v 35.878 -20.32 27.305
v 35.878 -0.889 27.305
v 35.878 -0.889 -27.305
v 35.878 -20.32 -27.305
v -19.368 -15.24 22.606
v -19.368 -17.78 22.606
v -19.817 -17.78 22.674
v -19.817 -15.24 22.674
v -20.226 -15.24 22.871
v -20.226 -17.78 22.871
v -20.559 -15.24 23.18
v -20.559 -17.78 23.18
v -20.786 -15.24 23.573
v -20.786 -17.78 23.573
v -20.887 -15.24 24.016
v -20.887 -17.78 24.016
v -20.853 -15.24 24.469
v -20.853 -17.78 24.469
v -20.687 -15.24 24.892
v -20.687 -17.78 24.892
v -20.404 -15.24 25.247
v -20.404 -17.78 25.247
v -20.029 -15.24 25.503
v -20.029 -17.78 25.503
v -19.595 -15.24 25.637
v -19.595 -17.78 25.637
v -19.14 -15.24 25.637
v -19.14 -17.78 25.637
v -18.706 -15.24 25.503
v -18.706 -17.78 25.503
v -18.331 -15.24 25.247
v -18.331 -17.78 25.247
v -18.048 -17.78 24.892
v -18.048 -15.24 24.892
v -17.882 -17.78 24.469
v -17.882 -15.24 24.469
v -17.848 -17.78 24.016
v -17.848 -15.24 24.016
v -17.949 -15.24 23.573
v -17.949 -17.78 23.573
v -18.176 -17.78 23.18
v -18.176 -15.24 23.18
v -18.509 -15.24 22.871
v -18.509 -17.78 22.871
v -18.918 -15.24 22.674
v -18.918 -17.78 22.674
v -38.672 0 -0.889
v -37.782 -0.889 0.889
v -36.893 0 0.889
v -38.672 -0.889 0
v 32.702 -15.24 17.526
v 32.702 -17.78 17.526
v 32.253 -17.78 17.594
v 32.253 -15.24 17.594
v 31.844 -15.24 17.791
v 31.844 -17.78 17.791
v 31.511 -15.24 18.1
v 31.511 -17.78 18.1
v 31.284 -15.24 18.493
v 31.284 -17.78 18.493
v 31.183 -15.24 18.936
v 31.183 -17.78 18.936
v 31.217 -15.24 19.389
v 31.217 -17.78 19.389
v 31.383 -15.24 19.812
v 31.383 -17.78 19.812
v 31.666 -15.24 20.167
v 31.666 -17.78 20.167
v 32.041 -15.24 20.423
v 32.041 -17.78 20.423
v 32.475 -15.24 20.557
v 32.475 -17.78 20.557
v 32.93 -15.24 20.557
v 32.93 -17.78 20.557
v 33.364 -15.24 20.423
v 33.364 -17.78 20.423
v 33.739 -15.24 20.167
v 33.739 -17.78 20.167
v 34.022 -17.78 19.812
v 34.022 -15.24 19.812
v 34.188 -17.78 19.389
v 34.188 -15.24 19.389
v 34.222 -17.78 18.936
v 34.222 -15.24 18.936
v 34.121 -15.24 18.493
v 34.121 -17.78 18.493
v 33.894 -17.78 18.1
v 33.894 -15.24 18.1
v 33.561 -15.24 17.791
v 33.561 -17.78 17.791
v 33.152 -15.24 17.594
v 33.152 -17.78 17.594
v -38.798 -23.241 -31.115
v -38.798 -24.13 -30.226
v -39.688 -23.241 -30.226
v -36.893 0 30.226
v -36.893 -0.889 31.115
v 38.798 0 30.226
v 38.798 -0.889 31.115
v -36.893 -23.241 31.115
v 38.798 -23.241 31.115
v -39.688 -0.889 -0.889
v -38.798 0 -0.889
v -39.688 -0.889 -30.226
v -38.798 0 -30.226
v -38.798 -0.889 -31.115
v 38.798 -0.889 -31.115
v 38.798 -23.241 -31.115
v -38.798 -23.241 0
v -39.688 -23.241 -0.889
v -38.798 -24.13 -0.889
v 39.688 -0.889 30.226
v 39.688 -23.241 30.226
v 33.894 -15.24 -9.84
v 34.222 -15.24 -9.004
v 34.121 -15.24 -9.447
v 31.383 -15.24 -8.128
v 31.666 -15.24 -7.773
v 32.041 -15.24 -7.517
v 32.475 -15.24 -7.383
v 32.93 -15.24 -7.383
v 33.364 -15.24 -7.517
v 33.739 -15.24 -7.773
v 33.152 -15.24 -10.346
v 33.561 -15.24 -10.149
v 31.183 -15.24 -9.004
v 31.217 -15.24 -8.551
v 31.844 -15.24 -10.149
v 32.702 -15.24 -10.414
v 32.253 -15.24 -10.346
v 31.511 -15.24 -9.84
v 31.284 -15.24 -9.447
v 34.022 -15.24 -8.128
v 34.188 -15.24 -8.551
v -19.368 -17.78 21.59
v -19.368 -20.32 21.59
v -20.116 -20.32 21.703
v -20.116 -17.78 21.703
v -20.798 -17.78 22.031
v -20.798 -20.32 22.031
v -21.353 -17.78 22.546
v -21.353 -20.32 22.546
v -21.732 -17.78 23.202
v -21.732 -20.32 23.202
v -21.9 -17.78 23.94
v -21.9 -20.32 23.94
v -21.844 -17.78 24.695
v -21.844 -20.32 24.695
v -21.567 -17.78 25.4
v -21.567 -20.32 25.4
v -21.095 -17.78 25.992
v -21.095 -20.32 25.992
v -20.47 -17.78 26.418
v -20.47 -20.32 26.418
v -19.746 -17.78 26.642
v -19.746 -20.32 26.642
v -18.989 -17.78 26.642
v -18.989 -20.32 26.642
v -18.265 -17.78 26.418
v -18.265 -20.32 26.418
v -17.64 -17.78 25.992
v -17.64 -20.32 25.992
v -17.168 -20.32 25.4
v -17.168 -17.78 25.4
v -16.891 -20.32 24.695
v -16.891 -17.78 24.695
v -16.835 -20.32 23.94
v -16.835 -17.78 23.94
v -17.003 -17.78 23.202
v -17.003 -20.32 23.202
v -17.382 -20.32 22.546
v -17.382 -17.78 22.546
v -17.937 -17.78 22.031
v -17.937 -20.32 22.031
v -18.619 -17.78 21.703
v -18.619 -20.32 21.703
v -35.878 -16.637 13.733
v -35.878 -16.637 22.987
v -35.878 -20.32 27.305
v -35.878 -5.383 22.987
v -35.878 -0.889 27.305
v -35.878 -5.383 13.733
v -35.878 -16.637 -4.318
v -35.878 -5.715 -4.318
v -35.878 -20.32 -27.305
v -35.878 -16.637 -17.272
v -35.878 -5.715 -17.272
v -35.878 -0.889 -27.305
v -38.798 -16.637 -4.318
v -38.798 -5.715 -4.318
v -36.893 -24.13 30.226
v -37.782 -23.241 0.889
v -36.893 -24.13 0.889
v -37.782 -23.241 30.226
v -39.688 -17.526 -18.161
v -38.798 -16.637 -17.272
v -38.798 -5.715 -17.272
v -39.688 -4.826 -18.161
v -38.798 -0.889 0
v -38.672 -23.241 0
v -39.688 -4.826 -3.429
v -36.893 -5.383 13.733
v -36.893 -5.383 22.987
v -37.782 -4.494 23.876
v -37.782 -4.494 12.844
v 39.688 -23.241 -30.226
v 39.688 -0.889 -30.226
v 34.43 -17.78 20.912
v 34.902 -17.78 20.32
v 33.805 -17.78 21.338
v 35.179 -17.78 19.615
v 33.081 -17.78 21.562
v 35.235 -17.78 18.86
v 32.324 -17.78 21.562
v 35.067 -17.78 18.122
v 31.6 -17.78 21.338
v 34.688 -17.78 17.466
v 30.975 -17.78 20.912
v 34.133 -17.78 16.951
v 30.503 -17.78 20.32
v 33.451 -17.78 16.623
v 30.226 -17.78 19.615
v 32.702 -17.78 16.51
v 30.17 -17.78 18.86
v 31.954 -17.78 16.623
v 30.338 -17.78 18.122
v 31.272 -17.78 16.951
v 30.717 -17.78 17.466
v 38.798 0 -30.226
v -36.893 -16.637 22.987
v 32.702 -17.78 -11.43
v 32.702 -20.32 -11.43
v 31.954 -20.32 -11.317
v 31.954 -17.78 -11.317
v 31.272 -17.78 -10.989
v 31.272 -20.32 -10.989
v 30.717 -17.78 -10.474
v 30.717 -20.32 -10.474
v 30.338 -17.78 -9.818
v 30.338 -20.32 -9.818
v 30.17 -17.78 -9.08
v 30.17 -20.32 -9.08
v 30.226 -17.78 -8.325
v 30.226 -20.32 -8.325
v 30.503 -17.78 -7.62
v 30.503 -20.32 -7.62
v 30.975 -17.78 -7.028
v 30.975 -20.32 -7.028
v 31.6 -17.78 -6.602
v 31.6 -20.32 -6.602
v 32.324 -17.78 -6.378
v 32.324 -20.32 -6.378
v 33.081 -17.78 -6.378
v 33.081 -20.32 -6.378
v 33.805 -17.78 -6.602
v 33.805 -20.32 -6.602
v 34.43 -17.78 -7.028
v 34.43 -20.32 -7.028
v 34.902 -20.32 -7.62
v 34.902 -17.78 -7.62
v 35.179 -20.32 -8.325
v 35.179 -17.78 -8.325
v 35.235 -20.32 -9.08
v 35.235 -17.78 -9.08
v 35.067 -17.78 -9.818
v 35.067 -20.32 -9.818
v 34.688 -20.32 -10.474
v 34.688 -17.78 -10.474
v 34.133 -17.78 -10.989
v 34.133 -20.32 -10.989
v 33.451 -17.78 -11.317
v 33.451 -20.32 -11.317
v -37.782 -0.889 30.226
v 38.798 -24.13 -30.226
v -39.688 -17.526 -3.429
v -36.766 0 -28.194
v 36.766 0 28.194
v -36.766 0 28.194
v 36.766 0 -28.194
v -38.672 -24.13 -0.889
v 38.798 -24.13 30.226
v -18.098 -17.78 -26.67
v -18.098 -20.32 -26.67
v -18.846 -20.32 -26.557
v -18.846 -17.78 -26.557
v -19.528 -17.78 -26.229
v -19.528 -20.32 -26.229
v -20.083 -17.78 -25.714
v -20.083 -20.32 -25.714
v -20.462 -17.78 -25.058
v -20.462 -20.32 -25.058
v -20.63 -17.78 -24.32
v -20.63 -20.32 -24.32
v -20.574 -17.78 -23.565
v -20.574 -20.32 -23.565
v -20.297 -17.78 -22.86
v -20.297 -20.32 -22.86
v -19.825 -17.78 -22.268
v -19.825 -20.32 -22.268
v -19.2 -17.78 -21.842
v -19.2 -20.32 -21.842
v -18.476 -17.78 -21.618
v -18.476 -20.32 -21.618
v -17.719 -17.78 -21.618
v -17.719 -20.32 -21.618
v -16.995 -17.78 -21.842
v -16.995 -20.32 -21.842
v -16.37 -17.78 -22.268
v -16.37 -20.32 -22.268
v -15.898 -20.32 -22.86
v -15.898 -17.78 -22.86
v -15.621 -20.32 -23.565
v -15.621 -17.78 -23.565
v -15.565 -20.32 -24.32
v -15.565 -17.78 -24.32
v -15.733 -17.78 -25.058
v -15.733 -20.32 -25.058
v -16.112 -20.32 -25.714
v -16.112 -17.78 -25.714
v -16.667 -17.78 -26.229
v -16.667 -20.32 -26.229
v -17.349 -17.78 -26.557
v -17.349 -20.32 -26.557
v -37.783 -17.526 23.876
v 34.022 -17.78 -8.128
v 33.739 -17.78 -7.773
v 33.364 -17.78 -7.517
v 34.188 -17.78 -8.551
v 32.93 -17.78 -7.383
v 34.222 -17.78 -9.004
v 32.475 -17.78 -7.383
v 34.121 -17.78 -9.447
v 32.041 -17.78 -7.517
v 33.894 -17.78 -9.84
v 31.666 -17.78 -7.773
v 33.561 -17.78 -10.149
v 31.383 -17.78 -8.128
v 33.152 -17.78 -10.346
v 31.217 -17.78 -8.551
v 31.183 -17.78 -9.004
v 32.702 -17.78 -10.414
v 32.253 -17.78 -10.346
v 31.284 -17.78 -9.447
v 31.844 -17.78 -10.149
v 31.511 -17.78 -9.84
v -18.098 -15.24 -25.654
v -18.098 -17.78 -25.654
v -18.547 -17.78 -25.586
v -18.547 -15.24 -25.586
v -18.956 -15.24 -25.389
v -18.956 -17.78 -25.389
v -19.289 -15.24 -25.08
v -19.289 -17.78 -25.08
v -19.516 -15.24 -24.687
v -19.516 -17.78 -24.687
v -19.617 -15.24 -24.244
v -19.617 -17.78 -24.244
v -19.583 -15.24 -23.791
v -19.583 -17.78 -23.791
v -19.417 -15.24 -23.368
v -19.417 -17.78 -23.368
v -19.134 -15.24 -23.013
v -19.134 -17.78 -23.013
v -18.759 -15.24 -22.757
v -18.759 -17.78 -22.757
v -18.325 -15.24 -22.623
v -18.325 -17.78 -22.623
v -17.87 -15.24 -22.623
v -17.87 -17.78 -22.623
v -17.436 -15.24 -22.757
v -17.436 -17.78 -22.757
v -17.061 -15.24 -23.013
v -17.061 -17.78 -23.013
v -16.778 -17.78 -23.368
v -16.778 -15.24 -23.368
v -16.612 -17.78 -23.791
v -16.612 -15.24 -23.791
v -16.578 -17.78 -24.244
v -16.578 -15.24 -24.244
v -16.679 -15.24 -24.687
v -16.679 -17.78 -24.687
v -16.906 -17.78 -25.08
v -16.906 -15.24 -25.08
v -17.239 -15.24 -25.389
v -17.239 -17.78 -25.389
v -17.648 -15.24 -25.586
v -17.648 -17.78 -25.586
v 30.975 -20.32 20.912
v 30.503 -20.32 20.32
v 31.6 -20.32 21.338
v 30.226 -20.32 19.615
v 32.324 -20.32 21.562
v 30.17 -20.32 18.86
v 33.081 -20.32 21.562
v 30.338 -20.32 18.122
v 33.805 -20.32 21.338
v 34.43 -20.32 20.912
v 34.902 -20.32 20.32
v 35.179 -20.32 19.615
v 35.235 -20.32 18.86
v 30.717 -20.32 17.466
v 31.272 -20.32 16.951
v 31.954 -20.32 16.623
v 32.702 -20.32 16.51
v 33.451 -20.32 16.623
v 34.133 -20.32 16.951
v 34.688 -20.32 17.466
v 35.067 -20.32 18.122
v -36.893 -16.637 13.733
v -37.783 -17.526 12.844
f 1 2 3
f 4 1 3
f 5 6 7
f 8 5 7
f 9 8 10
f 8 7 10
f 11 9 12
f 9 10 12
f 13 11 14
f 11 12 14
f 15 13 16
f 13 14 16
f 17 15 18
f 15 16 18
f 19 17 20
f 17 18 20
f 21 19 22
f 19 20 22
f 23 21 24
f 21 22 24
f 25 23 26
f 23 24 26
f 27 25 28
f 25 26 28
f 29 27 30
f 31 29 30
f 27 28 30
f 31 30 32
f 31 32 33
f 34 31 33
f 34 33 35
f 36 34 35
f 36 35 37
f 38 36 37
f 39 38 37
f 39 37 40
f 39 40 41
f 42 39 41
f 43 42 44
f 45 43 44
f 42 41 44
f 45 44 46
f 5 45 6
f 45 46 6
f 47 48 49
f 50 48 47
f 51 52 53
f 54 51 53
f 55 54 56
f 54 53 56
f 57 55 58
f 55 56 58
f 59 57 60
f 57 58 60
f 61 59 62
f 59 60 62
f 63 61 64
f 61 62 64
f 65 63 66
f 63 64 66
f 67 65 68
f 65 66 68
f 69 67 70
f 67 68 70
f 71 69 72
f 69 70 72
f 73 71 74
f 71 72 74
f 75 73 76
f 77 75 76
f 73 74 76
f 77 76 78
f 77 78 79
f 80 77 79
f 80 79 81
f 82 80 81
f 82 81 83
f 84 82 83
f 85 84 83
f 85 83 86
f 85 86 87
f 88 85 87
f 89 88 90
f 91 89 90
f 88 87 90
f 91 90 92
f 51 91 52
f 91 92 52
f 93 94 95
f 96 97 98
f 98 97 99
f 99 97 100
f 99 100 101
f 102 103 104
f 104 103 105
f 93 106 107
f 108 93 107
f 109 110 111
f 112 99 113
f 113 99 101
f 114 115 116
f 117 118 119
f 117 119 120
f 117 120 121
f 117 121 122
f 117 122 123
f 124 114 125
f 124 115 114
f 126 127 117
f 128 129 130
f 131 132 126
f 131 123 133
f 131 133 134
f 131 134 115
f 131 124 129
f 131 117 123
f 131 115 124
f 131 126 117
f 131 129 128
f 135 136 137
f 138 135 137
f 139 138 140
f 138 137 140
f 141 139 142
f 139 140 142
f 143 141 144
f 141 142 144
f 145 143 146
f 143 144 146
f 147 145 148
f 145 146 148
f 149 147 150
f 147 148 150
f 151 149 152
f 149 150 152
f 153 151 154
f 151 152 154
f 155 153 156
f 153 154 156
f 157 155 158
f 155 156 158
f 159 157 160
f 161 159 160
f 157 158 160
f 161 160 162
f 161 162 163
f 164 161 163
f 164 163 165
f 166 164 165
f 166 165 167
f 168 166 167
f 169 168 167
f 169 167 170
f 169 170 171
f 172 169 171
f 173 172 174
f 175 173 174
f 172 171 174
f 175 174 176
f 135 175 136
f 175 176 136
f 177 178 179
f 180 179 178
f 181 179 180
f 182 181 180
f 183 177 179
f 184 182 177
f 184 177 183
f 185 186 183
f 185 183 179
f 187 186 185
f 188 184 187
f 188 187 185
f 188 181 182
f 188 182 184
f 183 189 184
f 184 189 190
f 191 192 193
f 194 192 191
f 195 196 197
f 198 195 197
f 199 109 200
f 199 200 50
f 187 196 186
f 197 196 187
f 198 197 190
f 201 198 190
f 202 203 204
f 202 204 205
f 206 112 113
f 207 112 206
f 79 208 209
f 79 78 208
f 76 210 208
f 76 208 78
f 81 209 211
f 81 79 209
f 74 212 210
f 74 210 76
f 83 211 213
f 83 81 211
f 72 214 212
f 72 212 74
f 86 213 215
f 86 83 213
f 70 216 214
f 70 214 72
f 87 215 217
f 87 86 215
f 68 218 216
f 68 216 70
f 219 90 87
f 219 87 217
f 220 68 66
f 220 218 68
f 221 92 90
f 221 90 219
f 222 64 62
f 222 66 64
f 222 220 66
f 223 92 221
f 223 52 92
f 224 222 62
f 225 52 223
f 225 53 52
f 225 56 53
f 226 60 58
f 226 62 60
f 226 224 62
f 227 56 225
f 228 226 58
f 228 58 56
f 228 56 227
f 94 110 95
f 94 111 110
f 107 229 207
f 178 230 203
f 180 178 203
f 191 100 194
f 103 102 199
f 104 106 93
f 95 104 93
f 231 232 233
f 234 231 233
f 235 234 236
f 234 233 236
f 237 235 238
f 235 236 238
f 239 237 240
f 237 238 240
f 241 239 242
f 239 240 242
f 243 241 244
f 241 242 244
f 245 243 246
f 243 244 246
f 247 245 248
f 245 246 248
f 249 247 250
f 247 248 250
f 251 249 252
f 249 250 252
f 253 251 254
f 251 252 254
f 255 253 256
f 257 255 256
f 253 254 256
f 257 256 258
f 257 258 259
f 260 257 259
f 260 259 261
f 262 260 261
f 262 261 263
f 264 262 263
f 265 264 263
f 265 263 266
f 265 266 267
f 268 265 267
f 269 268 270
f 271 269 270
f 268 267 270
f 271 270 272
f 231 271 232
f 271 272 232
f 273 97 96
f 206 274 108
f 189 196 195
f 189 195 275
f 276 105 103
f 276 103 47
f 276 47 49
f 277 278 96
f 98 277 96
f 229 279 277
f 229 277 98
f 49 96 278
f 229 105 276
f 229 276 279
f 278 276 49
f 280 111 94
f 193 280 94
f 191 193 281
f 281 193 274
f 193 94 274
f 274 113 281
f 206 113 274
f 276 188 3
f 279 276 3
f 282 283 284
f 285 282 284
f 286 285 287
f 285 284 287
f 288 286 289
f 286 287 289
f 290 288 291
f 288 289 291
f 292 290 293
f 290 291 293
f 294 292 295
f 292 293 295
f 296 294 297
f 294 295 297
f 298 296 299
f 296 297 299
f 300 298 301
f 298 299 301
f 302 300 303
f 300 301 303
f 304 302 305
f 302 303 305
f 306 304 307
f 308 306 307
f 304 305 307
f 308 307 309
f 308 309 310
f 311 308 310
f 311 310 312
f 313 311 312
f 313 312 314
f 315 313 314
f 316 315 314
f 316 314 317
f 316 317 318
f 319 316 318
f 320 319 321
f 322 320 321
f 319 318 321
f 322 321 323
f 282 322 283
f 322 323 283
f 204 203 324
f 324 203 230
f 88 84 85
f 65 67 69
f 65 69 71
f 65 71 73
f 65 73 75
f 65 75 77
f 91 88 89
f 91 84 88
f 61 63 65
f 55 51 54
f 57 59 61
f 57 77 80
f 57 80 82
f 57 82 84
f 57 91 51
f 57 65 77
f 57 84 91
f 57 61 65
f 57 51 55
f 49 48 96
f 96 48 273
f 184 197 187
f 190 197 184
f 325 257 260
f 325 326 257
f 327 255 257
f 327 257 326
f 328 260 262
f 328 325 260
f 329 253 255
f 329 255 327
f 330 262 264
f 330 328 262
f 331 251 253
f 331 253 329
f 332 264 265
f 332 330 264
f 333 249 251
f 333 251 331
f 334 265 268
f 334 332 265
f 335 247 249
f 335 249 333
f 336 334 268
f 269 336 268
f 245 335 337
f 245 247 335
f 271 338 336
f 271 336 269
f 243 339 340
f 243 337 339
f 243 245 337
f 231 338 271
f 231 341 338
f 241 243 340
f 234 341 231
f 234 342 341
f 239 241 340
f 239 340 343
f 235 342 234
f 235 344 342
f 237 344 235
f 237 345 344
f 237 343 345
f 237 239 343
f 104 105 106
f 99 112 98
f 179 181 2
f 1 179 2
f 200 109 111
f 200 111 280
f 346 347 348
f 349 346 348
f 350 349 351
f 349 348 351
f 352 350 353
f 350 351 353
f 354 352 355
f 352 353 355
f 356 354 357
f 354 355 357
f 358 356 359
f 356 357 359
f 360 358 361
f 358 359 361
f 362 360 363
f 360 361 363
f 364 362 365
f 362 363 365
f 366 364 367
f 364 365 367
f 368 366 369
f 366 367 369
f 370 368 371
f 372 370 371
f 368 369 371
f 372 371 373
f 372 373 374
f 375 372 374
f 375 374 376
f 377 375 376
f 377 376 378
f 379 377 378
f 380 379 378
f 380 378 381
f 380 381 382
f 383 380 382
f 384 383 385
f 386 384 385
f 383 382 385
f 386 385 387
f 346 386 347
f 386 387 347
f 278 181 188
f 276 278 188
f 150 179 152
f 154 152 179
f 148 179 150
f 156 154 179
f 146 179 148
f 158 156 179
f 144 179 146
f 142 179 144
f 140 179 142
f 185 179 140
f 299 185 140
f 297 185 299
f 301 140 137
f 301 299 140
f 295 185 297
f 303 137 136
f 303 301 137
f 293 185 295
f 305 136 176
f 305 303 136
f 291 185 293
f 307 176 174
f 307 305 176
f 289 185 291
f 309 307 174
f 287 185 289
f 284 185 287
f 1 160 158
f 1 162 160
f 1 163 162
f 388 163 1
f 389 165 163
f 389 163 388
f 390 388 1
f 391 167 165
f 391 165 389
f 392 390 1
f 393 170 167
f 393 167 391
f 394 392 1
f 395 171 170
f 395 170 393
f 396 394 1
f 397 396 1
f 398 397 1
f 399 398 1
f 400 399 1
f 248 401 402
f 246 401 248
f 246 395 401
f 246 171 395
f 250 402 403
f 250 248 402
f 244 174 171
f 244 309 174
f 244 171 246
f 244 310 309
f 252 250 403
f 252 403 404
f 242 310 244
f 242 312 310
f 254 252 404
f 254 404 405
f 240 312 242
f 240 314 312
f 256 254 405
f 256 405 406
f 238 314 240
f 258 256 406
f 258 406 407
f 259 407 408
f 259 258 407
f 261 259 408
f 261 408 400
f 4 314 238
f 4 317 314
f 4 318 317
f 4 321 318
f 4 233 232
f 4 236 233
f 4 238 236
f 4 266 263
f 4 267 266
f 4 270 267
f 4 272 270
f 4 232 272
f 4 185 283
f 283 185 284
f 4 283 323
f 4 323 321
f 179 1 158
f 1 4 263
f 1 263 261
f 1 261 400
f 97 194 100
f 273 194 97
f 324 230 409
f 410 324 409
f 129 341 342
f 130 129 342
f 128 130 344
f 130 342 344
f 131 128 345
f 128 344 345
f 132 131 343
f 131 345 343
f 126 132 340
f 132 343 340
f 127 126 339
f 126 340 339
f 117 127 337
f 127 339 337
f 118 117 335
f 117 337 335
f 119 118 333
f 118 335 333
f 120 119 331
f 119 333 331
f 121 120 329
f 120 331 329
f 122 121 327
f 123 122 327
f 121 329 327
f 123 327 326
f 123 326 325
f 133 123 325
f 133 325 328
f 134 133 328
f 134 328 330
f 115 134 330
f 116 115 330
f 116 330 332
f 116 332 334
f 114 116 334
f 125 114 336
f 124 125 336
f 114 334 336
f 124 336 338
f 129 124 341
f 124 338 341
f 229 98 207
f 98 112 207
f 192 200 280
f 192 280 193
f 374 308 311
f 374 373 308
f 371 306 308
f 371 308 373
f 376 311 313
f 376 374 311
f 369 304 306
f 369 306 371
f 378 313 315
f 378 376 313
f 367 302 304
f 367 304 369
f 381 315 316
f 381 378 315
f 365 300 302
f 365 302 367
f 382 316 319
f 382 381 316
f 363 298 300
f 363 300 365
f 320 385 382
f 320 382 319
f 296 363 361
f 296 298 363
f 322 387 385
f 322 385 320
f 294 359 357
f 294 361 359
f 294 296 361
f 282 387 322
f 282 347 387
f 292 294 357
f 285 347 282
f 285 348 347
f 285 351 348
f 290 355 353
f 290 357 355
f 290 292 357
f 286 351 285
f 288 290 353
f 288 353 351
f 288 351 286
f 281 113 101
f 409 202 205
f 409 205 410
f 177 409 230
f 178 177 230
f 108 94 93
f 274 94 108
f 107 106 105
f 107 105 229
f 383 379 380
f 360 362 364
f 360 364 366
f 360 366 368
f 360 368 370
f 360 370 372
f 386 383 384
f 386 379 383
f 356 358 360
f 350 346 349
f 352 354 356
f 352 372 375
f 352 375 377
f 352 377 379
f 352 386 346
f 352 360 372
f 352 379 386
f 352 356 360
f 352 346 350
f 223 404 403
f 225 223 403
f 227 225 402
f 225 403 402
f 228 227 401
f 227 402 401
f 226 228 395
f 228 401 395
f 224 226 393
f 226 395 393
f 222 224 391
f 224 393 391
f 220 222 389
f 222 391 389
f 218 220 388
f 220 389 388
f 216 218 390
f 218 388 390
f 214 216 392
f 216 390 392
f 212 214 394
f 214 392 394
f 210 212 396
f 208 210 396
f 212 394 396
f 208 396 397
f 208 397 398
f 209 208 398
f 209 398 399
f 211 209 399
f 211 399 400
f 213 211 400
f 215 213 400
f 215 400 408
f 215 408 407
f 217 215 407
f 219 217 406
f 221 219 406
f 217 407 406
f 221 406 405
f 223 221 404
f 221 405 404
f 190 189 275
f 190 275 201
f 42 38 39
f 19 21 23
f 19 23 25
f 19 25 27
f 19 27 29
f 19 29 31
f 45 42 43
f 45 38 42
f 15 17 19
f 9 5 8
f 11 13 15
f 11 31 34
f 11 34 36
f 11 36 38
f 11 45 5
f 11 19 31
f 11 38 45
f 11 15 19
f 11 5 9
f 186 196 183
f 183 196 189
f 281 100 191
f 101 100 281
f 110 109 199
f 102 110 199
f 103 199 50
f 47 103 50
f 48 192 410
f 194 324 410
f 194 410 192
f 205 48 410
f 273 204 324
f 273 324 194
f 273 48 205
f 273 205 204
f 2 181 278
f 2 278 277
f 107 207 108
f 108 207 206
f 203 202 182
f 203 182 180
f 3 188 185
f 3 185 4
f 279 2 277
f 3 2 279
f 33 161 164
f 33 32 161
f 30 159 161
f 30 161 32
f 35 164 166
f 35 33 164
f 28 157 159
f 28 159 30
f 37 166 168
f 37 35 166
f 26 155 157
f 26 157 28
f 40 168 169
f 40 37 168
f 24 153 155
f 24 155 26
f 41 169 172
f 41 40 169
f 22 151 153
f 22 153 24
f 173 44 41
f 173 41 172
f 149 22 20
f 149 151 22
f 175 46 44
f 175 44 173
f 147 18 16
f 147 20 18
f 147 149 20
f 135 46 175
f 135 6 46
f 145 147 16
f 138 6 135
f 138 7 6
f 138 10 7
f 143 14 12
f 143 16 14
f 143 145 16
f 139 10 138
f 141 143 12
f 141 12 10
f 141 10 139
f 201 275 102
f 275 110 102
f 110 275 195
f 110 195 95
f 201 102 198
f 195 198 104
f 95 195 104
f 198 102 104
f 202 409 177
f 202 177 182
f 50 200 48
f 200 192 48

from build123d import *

# Parameters (mm, degrees)
SKETCH1_W           = 79.375
SKETCH1_H           = 62.23
BOSS_EXTRUDE1_DEPTH = 24.13
SHELL1_T            = -3.81
RISER_BASE_SKETCH_R = 2.54
BOSS_EXTRUDE3_DEPTH = 2.54
SKETCH9_R           = 1.524
BOSS_EXTRUDE4_DEPTH = 2.54
SKETCH10_W          = 12.954
SKETCH10_H          = 10.922
CUT_EXTRUDE1_DEPTH  = 3.81
SKETCH12_W          = 9.254
SKETCH12_H          = 11.254
CUT_EXTRUDE2_DEPTH  = 3.81
SKETCH13_W          = 31.115
SKETCH13_H          = 24.13
CUT_EXTRUDE3_DEPTH  = 1.905
CHAMFER1_SIZE       = 0.889


with BuildPart() as part:
    # Sketch1 → Boss-Extrude1 (new body)
    with BuildSketch(Plane(origin=(0, 0, 0), x_dir=(1, 0, 0), z_dir=(0, 1, 0))):
        Rectangle(SKETCH1_W, SKETCH1_H)
    extrude(amount=-BOSS_EXTRUDE1_DEPTH)

    # Shell1
    shell1_openings = [part.faces().sort_by_distance(p)[0] for p in [
        (0, 0, 0),
    ]]
    offset(amount=SHELL1_T, openings=shell1_openings, kind=Kind.INTERSECTION)

    # riser base sketch → Boss-Extrude3 (add)
    with BuildSketch(Plane(origin=(0, -20.32, 0), x_dir=(1, 0, 0), z_dir=(0, 1, 0))):
        with Locations(Location((32.7025, 8.89, 0), (0, 0, 90))):
            Circle(RISER_BASE_SKETCH_R)
        with Locations(Location((-18.0975, 24.13, 0), (0, 0, 90))):
            Circle(RISER_BASE_SKETCH_R)
        with Locations(Location((-19.3675, -24.13, 0), (0, 0, 90))):
            Circle(RISER_BASE_SKETCH_R)
        with Locations(Location((32.7025, -19.05, 0), (0, 0, 90))):
            Circle(RISER_BASE_SKETCH_R)
    extrude(amount=BOSS_EXTRUDE3_DEPTH)

    # Sketch9 → Boss-Extrude4 (add)
    with BuildSketch(Plane(origin=(0, -17.78, 0), x_dir=(-1, 0, 0), z_dir=(0, 1, 0))):
        with Locations(Location((19.3675, 24.13, 0), (0, 0, 270))):
            Circle(SKETCH9_R)
        with Locations(Location((-32.7025, 19.05, 0), (0, 0, 270))):
            Circle(SKETCH9_R)
        with Locations(Location((-32.7025, -8.89, 0), (0, 0, 270))):
            Circle(SKETCH9_R)
        with Locations(Location((18.0975, -24.13, 0), (0, 0, 270))):
            Circle(SKETCH9_R)
    extrude(amount=BOSS_EXTRUDE4_DEPTH)

    # Sketch10 → Cut-Extrude1 (cut)
    with BuildSketch(Plane.ZY.offset(39.6875)):
        with Locations((-10.795, -11.176)):
            Rectangle(SKETCH10_W, SKETCH10_H)
    extrude(amount=-CUT_EXTRUDE1_DEPTH, mode=Mode.SUBTRACT)

    # Sketch12 → Cut-Extrude2 (cut)
    with BuildSketch(Plane.ZY.offset(39.6875)):
        with Locations((18.36, -11.01)):
            Rectangle(SKETCH12_W, SKETCH12_H)
    extrude(amount=-CUT_EXTRUDE2_DEPTH, mode=Mode.SUBTRACT)

    # Sketch13 → Cut-Extrude3 (cut)
    with BuildSketch(Plane.ZY.offset(39.6875)):
        with Locations((15.5575, -12.065)):
            Rectangle(SKETCH13_W, SKETCH13_H)
    extrude(amount=-CUT_EXTRUDE3_DEPTH, mode=Mode.SUBTRACT)

    # Chamfer1
    chamfer1_edges = [part.edges().sort_by_distance(p)[0] for p in [
        (-39.6875, -24.13, -15.5575),
        (35.8775, 0, 0),
        (0, 0, -27.305),
        (-35.8775, 0, 0),
        (0, 0, 27.305),
        (39.6875, -24.13, 0),
        (-39.6875, 0, -15.5575),
        (0, 0, -31.115),
        (39.6875, 0, 0),
        (-39.6875, -11.176, -17.272),
        (-39.6875, -16.637, -10.795),
        (-39.6875, -11.176, -4.318),
        (-39.6875, -5.715, -10.795),
        (0, -24.13, -31.115),
        (39.6875, -12.065, 31.115),
        (-39.6875, -12.065, -31.115),
        (39.6875, -12.065, -31.115),
        (-37.7825, -16.637, 18.36),
        (0.9525, -24.13, 31.115),
        (0.9525, 0, 31.115),
        (-39.6875, -12.065, 0),
        (-37.7825, -12.065, 31.115),
        (-37.7825, -24.13, 15.5575),
        (-37.7825, -12.065, 0),
        (-38.735, -24.13, 0),
        (-37.7825, 0, 15.5575),
        (-38.735, 0, 0),
        (-37.7825, -11.01, 13.733),
        (-37.7825, -5.383, 18.36),
        (-37.7825, -11.01, 22.987),
    ]]
    chamfer(chamfer1_edges, length=CHAMFER1_SIZE)


solid = part.part
